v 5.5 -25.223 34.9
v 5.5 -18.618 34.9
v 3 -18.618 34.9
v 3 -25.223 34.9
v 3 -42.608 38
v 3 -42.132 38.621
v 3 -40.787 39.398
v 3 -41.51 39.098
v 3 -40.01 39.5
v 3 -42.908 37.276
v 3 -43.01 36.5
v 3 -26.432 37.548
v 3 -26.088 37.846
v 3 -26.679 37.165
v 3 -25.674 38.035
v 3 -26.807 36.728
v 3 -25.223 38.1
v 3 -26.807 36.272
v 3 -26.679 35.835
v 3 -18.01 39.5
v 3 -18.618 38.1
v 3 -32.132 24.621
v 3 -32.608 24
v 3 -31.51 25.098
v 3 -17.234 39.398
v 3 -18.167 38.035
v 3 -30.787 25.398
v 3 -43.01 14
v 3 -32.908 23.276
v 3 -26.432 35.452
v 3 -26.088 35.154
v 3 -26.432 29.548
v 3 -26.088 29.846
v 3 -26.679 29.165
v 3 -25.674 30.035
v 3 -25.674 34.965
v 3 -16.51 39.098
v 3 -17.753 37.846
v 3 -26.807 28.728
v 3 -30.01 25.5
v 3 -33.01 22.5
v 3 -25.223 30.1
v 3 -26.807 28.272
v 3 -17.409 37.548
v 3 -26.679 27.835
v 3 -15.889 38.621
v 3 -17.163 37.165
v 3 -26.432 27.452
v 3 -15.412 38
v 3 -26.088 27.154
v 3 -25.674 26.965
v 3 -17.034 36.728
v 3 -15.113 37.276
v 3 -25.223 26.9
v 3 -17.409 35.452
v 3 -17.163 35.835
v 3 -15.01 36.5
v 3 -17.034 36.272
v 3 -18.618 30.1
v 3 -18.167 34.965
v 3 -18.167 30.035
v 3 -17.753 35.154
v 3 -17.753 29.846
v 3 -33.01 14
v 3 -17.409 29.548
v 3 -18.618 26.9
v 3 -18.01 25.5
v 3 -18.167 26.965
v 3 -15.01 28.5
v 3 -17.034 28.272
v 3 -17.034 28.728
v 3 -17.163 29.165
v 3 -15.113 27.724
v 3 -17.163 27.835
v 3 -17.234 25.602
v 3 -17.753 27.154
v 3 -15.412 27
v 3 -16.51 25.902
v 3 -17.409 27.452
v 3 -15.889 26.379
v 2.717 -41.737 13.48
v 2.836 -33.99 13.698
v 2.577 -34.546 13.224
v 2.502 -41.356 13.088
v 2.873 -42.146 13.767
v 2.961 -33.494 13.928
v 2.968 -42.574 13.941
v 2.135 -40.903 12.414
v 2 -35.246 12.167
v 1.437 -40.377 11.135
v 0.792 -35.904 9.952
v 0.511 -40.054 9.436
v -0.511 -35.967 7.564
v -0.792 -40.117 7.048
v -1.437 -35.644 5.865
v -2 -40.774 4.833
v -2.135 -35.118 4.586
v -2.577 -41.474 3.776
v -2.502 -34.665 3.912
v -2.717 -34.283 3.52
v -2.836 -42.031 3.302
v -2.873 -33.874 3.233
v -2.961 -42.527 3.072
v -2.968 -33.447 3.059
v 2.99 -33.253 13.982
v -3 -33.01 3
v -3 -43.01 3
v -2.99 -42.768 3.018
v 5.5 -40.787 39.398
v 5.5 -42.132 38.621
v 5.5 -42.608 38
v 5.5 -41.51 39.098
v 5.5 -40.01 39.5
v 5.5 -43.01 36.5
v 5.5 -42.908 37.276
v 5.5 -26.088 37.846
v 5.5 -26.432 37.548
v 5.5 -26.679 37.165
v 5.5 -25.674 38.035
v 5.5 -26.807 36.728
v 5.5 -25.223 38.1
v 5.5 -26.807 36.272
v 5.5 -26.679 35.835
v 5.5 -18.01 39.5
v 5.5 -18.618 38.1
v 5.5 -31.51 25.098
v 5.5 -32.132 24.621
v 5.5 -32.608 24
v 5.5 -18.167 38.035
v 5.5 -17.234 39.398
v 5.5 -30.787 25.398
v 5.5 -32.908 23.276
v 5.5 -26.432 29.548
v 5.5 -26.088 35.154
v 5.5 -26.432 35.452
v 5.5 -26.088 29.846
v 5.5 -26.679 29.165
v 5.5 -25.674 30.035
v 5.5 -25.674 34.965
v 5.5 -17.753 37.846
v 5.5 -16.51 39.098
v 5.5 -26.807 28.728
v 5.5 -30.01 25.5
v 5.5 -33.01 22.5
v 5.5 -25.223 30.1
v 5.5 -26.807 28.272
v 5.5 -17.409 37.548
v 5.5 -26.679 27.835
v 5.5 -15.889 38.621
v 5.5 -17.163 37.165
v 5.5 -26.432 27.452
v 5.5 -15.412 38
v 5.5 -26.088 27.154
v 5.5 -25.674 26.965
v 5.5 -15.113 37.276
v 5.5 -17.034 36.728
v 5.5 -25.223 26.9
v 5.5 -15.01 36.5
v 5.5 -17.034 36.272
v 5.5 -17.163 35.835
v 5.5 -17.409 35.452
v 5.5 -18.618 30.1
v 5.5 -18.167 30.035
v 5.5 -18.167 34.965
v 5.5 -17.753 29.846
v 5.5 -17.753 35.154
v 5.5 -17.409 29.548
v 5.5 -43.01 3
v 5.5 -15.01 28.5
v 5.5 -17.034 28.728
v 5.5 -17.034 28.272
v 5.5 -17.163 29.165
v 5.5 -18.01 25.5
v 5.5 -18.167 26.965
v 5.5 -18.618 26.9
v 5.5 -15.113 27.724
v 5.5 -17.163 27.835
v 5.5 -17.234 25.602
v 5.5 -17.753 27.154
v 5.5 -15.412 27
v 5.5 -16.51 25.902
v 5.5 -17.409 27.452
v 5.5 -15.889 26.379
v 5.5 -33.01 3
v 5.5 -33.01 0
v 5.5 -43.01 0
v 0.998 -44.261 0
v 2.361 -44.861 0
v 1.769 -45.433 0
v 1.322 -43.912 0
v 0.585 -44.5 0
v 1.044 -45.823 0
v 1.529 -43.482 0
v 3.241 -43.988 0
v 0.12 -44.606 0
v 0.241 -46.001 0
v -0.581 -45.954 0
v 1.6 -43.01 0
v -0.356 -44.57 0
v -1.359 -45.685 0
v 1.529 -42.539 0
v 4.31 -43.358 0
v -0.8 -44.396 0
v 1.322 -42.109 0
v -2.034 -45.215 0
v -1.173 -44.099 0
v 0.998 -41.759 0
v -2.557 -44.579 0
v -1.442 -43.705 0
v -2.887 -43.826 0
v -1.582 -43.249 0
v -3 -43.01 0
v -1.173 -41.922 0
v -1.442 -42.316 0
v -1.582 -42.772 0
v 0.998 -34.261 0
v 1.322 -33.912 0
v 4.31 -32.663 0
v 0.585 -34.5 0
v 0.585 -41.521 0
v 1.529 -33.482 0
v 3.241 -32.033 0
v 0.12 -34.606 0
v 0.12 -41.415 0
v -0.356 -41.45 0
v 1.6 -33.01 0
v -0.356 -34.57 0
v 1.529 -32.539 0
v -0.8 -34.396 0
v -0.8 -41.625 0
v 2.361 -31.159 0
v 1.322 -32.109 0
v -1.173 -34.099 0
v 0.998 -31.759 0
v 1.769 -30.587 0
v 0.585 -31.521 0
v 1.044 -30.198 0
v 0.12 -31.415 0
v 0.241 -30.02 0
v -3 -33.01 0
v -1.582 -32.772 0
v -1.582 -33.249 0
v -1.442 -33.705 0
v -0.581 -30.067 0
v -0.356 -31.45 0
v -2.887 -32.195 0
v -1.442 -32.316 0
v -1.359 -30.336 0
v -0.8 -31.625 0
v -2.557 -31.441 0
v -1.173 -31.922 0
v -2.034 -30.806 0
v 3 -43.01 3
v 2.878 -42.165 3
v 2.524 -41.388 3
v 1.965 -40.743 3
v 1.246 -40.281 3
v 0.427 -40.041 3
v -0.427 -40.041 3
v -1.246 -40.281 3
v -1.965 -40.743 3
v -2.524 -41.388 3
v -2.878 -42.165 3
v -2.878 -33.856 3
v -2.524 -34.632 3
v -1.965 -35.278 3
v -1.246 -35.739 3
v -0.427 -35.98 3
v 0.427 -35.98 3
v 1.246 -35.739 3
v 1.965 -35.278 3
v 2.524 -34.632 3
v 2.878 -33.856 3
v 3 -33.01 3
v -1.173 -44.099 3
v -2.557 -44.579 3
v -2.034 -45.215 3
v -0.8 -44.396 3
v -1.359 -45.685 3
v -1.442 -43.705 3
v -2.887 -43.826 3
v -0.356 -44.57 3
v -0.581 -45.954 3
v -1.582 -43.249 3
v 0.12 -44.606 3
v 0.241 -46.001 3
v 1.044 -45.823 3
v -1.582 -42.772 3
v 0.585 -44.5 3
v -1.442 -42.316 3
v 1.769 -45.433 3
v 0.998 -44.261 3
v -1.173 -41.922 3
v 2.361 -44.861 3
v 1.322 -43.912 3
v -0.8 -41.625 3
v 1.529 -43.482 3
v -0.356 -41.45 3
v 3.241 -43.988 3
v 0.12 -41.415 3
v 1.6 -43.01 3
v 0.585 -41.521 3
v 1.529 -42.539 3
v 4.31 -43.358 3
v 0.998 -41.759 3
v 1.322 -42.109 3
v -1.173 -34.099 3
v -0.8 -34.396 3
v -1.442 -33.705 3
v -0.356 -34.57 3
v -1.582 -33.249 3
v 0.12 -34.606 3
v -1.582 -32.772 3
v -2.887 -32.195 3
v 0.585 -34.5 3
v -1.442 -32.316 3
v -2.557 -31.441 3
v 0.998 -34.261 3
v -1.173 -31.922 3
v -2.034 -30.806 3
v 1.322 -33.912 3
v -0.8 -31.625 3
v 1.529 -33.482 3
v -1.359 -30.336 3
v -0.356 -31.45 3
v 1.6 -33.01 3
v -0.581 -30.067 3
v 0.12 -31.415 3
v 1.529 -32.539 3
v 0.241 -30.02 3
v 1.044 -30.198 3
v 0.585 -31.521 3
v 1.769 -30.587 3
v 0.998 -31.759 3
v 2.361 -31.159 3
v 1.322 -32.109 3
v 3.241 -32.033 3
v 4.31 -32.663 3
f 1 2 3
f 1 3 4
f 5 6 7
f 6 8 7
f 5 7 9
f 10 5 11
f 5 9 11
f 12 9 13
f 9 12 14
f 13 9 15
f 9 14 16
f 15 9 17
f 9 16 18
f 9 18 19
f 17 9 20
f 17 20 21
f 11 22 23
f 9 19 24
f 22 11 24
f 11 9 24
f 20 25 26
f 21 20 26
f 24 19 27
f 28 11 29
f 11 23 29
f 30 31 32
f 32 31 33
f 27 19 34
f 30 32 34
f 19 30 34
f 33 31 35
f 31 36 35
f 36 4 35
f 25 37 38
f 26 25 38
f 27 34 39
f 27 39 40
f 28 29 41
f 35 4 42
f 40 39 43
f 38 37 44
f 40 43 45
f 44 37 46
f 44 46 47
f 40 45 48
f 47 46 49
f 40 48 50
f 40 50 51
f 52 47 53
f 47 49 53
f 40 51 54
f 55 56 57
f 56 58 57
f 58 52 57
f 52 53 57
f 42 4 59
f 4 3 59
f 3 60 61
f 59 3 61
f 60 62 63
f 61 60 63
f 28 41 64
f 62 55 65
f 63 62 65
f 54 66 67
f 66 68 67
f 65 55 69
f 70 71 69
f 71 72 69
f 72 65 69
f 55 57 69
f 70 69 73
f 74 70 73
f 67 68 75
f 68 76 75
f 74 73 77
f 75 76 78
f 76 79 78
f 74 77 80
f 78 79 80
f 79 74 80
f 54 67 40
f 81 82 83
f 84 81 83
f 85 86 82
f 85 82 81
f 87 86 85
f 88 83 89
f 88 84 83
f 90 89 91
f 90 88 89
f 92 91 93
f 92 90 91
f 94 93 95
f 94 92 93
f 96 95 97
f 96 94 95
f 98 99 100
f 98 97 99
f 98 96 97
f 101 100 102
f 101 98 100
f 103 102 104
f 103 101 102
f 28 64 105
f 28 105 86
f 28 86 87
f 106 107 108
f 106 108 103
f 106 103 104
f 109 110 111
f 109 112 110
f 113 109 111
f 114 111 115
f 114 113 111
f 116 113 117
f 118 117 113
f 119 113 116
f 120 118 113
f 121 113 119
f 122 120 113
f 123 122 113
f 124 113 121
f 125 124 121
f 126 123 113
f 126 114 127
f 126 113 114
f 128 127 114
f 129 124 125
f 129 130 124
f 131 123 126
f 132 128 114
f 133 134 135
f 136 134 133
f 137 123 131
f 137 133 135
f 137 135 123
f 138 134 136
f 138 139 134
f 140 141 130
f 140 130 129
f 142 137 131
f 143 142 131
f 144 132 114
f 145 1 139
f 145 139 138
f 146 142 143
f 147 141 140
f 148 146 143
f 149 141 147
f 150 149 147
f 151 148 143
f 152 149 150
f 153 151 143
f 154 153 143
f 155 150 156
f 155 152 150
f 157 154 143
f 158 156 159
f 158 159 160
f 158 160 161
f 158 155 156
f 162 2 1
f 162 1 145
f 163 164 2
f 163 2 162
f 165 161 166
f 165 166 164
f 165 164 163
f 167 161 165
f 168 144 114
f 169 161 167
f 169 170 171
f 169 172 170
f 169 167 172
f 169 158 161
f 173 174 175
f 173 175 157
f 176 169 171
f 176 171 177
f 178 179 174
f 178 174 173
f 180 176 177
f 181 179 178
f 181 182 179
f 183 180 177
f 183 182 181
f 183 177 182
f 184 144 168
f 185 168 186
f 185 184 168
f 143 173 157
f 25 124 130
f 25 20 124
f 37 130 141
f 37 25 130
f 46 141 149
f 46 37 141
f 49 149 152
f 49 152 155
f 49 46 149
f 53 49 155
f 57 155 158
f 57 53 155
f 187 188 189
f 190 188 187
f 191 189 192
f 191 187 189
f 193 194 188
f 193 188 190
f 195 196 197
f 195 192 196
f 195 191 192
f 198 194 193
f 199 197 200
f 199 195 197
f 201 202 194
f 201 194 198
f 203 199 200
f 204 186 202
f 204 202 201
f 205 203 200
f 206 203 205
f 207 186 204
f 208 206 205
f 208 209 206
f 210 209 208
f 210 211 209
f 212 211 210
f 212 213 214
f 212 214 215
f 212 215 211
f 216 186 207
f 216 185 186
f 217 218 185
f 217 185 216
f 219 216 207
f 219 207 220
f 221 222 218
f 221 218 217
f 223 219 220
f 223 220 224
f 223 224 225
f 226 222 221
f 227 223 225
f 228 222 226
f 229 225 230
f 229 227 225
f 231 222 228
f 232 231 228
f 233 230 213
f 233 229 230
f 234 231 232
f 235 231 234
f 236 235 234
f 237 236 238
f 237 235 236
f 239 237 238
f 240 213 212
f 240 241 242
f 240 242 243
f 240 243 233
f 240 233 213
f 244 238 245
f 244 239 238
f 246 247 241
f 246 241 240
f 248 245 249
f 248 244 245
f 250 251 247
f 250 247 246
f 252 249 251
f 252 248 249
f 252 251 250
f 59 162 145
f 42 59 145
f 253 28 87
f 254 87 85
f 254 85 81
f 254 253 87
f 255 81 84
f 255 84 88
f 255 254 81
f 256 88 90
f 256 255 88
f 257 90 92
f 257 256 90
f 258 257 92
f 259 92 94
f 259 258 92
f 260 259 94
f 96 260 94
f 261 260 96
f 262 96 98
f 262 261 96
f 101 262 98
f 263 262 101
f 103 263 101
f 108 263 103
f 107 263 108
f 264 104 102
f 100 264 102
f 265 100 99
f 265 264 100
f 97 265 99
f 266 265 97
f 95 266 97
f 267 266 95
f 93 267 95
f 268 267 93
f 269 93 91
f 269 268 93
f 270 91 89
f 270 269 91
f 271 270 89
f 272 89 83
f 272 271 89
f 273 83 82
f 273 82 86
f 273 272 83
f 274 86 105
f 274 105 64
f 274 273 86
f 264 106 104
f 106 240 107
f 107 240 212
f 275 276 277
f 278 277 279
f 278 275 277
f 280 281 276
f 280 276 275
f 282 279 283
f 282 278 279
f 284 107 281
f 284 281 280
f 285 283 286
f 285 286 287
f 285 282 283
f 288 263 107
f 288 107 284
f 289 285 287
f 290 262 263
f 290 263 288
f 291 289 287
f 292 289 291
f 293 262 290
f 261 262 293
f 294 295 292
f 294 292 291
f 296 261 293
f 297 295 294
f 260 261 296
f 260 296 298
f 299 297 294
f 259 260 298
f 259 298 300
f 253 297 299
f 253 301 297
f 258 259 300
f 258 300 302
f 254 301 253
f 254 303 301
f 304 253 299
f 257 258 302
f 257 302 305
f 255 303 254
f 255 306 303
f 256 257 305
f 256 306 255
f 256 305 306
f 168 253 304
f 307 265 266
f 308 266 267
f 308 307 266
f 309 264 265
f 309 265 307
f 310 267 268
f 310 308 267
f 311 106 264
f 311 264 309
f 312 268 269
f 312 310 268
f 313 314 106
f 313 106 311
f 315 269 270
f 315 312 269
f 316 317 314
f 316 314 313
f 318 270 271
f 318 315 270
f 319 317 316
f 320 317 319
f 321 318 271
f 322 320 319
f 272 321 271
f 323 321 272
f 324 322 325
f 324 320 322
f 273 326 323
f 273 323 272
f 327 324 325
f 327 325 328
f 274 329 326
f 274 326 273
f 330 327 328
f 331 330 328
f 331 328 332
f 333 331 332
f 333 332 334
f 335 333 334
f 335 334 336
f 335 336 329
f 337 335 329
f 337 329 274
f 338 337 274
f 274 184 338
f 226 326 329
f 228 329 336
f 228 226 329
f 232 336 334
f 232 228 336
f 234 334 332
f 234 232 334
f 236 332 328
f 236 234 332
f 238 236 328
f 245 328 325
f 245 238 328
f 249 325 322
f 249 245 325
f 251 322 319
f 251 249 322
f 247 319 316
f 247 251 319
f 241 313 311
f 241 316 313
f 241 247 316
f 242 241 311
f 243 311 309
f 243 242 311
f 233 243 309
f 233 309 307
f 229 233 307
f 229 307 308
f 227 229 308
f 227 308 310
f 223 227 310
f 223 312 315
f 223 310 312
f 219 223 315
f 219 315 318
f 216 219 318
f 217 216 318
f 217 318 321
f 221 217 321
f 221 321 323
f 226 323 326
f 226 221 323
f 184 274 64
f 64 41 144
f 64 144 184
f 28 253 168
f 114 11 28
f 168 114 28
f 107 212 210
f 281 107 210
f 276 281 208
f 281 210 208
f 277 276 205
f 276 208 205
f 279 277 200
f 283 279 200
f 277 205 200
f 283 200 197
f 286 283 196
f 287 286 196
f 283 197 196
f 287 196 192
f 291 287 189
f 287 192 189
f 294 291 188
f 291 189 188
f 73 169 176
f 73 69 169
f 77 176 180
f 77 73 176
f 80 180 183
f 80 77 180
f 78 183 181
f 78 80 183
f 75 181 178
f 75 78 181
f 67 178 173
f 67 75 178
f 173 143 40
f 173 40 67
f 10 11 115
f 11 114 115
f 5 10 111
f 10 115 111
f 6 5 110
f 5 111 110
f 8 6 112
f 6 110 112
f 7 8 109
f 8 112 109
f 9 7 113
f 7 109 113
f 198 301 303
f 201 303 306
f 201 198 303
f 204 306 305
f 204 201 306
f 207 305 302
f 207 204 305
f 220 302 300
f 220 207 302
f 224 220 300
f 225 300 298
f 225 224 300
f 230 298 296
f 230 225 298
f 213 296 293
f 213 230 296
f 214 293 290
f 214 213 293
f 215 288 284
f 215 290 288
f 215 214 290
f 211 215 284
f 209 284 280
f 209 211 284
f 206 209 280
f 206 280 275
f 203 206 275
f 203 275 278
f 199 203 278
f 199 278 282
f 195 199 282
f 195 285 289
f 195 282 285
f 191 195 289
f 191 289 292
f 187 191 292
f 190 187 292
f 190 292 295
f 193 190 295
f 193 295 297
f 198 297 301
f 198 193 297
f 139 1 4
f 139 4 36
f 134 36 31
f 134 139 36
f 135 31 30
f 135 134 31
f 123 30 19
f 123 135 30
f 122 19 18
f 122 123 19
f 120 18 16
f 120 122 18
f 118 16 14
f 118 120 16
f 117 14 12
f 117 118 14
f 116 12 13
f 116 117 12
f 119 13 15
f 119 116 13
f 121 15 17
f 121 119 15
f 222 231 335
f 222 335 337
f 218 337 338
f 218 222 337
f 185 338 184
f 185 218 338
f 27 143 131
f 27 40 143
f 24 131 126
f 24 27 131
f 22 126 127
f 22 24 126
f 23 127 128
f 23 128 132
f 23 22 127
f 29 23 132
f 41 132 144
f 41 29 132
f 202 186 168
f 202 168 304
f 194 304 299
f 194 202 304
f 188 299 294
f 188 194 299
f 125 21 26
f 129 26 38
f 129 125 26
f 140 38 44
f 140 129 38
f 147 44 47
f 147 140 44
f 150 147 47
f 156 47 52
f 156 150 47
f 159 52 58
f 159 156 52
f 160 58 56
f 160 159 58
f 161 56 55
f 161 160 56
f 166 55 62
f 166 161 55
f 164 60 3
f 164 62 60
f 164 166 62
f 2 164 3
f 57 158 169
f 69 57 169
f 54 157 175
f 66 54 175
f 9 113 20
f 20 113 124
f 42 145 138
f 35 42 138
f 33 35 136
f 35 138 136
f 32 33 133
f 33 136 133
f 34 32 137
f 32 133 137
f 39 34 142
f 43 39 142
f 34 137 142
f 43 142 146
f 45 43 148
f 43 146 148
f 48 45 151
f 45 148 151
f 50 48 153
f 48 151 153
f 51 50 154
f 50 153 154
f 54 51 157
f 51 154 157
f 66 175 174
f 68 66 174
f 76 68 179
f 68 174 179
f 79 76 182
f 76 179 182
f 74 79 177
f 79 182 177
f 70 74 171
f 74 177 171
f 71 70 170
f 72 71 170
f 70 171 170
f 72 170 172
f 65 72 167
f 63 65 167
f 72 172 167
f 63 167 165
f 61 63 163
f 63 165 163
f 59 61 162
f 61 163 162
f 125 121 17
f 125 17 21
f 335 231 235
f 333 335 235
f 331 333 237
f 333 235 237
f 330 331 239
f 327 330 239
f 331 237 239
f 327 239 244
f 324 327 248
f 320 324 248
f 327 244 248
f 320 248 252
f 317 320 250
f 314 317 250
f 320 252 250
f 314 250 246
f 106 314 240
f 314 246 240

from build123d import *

# Parameters (mm, degrees)
SKETCH_1_R          = 1.6
EXTRUDE_1_DEPTH     = 3
SKETCH_3_W          = 2.5
SKETCH_3_H          = 10
EXTRUDE_2_DEPTH     = 36.5
FILLET_1_R          = 5
FILLET_2_R          = 5
SKETCH_4_W          = 14
SKETCH_4_H          = 18
EXTRUDE_3_DEPTH     = 2.5
CUT_EXTRUDE_1_DEPTH = 62.232764559
EXTRUDE_4_DEPTH     = 10
SKETCH_8_R          = 3
CUT_EXTRUDE_2_DEPTH = 59.986875282
FILLET_3_R          = 3


with BuildPart() as part:
    # 草图1 → 凸台-拉伸1 (new body)
    with BuildSketch(Plane.XY):
        with BuildLine():
            ThreePointArc((3, -33.010340746), (0, -30.010340746), (-3, -33.010340746))
            Line((-3, -33.010340746), (-3, -43.010340746))
            ThreePointArc((-3, -43.010340746), (0, -46.010340746), (3, -43.010340746))
            Line((3, -43.010340746), (5.5, -43.010340746))
            Line((5.5, -43.010340746), (5.5, -33.010340746))
            Line((5.5, -33.010340746), (3, -33.010340746))
        make_face()
        with Locations((0, -33.010340746)):
            Circle(SKETCH_1_R, mode=Mode.SUBTRACT)
        with Locations((0, -43.010340746)):
            Circle(SKETCH_1_R, mode=Mode.SUBTRACT)
    extrude(amount=EXTRUDE_1_DEPTH)

    # 草图3 → 凸台-拉伸2 (add)
    with BuildSketch(Plane.XY.offset(3)):
        with Locations((4.25, -38.010340746)):
            Rectangle(SKETCH_3_W, SKETCH_3_H)
    extrude(amount=EXTRUDE_2_DEPTH)

    # 圆角1
    # the kernel refuses this fillet: 5 mm, written as the material it adds along each edge
    with BuildSketch(Plane(origin=(3, -43.010340746, 0), x_dir=(-0.32639560491693326, -0.9452332564456825, 0), z_dir=(0, 0, 1))) as fillet_1_piece_1:
        with BuildLine():
            CenterArc((3.590351654, 4.726166282), FILLET_1_R, 208.20428203, 42.745569225)
            Line((-0.815989012, 2.363083141), (0, 0))
            ThreePointArc((0, 0), (0.979186815, 0.164300231), (1.95837363, 0))
        make_face()
    extrude(amount=3)

    # 圆角2
    # the kernel refuses this fillet: 5 mm, written as the material it adds along each edge
    with BuildSketch(Plane(origin=(3, -33.010340746, 0), x_dir=(1, 0, 0), z_dir=(0, 0, 1))) as fillet_2_piece_1:
        with BuildLine():
            CenterArc((3.295454545, 4.936319688), FILLET_2_R, 218.100297491, 42.745569225)
            ThreePointArc((-0.639204545, 1.851119883), (-0.164300231, 0.979186815), (0, 0))
            Line((0, 0), (2.5, 0))
        make_face()
    extrude(amount=3)

    # 草图4 → 凸台-拉伸3 (add)
    with BuildSketch(Plane(origin=(5.5, 0, 0), x_dir=(0, 0, -1), z_dir=(1, 0, 0))):
        with Locations((-32.5, -24.010340746)):
            Rectangle(SKETCH_4_W, SKETCH_4_H)
    extrude(amount=-EXTRUDE_3_DEPTH)

    # 草图5 → 切除-拉伸1 (cut, through all)
    with BuildSketch(Plane(origin=(5.5, 0, 0), x_dir=(0, 0, -1), z_dir=(1, 0, 0))):
        with BuildLine():
            Line((-34.9, -18.617918523), (-34.9, -25.223242404))
            ThreePointArc((-34.9, -25.223242404), (-36.5, -26.823242404), (-38.1, -25.223242404))
            Line((-38.1, -25.223242404), (-38.1, -18.617918523))
            ThreePointArc((-38.1, -18.617918523), (-36.5, -17.017918523), (-34.9, -18.617918523))
        make_face()
        with BuildLine():
            Line((-30.1, -18.617918523), (-30.1, -25.223242404))
            ThreePointArc((-30.1, -25.223242404), (-28.5, -26.823242404), (-26.9, -25.223242404))
            Line((-26.9, -25.223242404), (-26.9, -18.617918523))
            ThreePointArc((-26.9, -18.617918523), (-28.5, -17.017918523), (-30.1, -18.617918523))
        make_face()
    extrude(amount=-CUT_EXTRUDE_1_DEPTH, mode=Mode.SUBTRACT)

    # 草图6 → 凸台-拉伸4 (add)
    with BuildSketch(Plane.XZ.offset(43.010340746)):
        Polygon((3, 14), (-3, 3), (3, 3), align=None)
    extrude(amount=-EXTRUDE_4_DEPTH)

    # 草图8 → 切除-拉伸2 (cut, through all)
    with BuildSketch(Plane.XY.offset(3)):
        with Locations((0, -43.010340746)):
            Circle(SKETCH_8_R)
        with Locations((0, -33.010340746)):
            Circle(SKETCH_8_R)
    extrude(amount=CUT_EXTRUDE_2_DEPTH, mode=Mode.SUBTRACT)

    # 圆角3
    fillet_3_edges = [part.edges().sort_by_distance(p)[0] for p in [
        (4.25, -43.010340746, 39.5),
        (4.25, -33.010340746, 25.5),
        (4.25, -15.010340746, 39.5),
        (4.25, -15.010340746, 25.5),
    ]]
    fillet(fillet_3_edges, radius=FILLET_3_R)


solid = part.part
